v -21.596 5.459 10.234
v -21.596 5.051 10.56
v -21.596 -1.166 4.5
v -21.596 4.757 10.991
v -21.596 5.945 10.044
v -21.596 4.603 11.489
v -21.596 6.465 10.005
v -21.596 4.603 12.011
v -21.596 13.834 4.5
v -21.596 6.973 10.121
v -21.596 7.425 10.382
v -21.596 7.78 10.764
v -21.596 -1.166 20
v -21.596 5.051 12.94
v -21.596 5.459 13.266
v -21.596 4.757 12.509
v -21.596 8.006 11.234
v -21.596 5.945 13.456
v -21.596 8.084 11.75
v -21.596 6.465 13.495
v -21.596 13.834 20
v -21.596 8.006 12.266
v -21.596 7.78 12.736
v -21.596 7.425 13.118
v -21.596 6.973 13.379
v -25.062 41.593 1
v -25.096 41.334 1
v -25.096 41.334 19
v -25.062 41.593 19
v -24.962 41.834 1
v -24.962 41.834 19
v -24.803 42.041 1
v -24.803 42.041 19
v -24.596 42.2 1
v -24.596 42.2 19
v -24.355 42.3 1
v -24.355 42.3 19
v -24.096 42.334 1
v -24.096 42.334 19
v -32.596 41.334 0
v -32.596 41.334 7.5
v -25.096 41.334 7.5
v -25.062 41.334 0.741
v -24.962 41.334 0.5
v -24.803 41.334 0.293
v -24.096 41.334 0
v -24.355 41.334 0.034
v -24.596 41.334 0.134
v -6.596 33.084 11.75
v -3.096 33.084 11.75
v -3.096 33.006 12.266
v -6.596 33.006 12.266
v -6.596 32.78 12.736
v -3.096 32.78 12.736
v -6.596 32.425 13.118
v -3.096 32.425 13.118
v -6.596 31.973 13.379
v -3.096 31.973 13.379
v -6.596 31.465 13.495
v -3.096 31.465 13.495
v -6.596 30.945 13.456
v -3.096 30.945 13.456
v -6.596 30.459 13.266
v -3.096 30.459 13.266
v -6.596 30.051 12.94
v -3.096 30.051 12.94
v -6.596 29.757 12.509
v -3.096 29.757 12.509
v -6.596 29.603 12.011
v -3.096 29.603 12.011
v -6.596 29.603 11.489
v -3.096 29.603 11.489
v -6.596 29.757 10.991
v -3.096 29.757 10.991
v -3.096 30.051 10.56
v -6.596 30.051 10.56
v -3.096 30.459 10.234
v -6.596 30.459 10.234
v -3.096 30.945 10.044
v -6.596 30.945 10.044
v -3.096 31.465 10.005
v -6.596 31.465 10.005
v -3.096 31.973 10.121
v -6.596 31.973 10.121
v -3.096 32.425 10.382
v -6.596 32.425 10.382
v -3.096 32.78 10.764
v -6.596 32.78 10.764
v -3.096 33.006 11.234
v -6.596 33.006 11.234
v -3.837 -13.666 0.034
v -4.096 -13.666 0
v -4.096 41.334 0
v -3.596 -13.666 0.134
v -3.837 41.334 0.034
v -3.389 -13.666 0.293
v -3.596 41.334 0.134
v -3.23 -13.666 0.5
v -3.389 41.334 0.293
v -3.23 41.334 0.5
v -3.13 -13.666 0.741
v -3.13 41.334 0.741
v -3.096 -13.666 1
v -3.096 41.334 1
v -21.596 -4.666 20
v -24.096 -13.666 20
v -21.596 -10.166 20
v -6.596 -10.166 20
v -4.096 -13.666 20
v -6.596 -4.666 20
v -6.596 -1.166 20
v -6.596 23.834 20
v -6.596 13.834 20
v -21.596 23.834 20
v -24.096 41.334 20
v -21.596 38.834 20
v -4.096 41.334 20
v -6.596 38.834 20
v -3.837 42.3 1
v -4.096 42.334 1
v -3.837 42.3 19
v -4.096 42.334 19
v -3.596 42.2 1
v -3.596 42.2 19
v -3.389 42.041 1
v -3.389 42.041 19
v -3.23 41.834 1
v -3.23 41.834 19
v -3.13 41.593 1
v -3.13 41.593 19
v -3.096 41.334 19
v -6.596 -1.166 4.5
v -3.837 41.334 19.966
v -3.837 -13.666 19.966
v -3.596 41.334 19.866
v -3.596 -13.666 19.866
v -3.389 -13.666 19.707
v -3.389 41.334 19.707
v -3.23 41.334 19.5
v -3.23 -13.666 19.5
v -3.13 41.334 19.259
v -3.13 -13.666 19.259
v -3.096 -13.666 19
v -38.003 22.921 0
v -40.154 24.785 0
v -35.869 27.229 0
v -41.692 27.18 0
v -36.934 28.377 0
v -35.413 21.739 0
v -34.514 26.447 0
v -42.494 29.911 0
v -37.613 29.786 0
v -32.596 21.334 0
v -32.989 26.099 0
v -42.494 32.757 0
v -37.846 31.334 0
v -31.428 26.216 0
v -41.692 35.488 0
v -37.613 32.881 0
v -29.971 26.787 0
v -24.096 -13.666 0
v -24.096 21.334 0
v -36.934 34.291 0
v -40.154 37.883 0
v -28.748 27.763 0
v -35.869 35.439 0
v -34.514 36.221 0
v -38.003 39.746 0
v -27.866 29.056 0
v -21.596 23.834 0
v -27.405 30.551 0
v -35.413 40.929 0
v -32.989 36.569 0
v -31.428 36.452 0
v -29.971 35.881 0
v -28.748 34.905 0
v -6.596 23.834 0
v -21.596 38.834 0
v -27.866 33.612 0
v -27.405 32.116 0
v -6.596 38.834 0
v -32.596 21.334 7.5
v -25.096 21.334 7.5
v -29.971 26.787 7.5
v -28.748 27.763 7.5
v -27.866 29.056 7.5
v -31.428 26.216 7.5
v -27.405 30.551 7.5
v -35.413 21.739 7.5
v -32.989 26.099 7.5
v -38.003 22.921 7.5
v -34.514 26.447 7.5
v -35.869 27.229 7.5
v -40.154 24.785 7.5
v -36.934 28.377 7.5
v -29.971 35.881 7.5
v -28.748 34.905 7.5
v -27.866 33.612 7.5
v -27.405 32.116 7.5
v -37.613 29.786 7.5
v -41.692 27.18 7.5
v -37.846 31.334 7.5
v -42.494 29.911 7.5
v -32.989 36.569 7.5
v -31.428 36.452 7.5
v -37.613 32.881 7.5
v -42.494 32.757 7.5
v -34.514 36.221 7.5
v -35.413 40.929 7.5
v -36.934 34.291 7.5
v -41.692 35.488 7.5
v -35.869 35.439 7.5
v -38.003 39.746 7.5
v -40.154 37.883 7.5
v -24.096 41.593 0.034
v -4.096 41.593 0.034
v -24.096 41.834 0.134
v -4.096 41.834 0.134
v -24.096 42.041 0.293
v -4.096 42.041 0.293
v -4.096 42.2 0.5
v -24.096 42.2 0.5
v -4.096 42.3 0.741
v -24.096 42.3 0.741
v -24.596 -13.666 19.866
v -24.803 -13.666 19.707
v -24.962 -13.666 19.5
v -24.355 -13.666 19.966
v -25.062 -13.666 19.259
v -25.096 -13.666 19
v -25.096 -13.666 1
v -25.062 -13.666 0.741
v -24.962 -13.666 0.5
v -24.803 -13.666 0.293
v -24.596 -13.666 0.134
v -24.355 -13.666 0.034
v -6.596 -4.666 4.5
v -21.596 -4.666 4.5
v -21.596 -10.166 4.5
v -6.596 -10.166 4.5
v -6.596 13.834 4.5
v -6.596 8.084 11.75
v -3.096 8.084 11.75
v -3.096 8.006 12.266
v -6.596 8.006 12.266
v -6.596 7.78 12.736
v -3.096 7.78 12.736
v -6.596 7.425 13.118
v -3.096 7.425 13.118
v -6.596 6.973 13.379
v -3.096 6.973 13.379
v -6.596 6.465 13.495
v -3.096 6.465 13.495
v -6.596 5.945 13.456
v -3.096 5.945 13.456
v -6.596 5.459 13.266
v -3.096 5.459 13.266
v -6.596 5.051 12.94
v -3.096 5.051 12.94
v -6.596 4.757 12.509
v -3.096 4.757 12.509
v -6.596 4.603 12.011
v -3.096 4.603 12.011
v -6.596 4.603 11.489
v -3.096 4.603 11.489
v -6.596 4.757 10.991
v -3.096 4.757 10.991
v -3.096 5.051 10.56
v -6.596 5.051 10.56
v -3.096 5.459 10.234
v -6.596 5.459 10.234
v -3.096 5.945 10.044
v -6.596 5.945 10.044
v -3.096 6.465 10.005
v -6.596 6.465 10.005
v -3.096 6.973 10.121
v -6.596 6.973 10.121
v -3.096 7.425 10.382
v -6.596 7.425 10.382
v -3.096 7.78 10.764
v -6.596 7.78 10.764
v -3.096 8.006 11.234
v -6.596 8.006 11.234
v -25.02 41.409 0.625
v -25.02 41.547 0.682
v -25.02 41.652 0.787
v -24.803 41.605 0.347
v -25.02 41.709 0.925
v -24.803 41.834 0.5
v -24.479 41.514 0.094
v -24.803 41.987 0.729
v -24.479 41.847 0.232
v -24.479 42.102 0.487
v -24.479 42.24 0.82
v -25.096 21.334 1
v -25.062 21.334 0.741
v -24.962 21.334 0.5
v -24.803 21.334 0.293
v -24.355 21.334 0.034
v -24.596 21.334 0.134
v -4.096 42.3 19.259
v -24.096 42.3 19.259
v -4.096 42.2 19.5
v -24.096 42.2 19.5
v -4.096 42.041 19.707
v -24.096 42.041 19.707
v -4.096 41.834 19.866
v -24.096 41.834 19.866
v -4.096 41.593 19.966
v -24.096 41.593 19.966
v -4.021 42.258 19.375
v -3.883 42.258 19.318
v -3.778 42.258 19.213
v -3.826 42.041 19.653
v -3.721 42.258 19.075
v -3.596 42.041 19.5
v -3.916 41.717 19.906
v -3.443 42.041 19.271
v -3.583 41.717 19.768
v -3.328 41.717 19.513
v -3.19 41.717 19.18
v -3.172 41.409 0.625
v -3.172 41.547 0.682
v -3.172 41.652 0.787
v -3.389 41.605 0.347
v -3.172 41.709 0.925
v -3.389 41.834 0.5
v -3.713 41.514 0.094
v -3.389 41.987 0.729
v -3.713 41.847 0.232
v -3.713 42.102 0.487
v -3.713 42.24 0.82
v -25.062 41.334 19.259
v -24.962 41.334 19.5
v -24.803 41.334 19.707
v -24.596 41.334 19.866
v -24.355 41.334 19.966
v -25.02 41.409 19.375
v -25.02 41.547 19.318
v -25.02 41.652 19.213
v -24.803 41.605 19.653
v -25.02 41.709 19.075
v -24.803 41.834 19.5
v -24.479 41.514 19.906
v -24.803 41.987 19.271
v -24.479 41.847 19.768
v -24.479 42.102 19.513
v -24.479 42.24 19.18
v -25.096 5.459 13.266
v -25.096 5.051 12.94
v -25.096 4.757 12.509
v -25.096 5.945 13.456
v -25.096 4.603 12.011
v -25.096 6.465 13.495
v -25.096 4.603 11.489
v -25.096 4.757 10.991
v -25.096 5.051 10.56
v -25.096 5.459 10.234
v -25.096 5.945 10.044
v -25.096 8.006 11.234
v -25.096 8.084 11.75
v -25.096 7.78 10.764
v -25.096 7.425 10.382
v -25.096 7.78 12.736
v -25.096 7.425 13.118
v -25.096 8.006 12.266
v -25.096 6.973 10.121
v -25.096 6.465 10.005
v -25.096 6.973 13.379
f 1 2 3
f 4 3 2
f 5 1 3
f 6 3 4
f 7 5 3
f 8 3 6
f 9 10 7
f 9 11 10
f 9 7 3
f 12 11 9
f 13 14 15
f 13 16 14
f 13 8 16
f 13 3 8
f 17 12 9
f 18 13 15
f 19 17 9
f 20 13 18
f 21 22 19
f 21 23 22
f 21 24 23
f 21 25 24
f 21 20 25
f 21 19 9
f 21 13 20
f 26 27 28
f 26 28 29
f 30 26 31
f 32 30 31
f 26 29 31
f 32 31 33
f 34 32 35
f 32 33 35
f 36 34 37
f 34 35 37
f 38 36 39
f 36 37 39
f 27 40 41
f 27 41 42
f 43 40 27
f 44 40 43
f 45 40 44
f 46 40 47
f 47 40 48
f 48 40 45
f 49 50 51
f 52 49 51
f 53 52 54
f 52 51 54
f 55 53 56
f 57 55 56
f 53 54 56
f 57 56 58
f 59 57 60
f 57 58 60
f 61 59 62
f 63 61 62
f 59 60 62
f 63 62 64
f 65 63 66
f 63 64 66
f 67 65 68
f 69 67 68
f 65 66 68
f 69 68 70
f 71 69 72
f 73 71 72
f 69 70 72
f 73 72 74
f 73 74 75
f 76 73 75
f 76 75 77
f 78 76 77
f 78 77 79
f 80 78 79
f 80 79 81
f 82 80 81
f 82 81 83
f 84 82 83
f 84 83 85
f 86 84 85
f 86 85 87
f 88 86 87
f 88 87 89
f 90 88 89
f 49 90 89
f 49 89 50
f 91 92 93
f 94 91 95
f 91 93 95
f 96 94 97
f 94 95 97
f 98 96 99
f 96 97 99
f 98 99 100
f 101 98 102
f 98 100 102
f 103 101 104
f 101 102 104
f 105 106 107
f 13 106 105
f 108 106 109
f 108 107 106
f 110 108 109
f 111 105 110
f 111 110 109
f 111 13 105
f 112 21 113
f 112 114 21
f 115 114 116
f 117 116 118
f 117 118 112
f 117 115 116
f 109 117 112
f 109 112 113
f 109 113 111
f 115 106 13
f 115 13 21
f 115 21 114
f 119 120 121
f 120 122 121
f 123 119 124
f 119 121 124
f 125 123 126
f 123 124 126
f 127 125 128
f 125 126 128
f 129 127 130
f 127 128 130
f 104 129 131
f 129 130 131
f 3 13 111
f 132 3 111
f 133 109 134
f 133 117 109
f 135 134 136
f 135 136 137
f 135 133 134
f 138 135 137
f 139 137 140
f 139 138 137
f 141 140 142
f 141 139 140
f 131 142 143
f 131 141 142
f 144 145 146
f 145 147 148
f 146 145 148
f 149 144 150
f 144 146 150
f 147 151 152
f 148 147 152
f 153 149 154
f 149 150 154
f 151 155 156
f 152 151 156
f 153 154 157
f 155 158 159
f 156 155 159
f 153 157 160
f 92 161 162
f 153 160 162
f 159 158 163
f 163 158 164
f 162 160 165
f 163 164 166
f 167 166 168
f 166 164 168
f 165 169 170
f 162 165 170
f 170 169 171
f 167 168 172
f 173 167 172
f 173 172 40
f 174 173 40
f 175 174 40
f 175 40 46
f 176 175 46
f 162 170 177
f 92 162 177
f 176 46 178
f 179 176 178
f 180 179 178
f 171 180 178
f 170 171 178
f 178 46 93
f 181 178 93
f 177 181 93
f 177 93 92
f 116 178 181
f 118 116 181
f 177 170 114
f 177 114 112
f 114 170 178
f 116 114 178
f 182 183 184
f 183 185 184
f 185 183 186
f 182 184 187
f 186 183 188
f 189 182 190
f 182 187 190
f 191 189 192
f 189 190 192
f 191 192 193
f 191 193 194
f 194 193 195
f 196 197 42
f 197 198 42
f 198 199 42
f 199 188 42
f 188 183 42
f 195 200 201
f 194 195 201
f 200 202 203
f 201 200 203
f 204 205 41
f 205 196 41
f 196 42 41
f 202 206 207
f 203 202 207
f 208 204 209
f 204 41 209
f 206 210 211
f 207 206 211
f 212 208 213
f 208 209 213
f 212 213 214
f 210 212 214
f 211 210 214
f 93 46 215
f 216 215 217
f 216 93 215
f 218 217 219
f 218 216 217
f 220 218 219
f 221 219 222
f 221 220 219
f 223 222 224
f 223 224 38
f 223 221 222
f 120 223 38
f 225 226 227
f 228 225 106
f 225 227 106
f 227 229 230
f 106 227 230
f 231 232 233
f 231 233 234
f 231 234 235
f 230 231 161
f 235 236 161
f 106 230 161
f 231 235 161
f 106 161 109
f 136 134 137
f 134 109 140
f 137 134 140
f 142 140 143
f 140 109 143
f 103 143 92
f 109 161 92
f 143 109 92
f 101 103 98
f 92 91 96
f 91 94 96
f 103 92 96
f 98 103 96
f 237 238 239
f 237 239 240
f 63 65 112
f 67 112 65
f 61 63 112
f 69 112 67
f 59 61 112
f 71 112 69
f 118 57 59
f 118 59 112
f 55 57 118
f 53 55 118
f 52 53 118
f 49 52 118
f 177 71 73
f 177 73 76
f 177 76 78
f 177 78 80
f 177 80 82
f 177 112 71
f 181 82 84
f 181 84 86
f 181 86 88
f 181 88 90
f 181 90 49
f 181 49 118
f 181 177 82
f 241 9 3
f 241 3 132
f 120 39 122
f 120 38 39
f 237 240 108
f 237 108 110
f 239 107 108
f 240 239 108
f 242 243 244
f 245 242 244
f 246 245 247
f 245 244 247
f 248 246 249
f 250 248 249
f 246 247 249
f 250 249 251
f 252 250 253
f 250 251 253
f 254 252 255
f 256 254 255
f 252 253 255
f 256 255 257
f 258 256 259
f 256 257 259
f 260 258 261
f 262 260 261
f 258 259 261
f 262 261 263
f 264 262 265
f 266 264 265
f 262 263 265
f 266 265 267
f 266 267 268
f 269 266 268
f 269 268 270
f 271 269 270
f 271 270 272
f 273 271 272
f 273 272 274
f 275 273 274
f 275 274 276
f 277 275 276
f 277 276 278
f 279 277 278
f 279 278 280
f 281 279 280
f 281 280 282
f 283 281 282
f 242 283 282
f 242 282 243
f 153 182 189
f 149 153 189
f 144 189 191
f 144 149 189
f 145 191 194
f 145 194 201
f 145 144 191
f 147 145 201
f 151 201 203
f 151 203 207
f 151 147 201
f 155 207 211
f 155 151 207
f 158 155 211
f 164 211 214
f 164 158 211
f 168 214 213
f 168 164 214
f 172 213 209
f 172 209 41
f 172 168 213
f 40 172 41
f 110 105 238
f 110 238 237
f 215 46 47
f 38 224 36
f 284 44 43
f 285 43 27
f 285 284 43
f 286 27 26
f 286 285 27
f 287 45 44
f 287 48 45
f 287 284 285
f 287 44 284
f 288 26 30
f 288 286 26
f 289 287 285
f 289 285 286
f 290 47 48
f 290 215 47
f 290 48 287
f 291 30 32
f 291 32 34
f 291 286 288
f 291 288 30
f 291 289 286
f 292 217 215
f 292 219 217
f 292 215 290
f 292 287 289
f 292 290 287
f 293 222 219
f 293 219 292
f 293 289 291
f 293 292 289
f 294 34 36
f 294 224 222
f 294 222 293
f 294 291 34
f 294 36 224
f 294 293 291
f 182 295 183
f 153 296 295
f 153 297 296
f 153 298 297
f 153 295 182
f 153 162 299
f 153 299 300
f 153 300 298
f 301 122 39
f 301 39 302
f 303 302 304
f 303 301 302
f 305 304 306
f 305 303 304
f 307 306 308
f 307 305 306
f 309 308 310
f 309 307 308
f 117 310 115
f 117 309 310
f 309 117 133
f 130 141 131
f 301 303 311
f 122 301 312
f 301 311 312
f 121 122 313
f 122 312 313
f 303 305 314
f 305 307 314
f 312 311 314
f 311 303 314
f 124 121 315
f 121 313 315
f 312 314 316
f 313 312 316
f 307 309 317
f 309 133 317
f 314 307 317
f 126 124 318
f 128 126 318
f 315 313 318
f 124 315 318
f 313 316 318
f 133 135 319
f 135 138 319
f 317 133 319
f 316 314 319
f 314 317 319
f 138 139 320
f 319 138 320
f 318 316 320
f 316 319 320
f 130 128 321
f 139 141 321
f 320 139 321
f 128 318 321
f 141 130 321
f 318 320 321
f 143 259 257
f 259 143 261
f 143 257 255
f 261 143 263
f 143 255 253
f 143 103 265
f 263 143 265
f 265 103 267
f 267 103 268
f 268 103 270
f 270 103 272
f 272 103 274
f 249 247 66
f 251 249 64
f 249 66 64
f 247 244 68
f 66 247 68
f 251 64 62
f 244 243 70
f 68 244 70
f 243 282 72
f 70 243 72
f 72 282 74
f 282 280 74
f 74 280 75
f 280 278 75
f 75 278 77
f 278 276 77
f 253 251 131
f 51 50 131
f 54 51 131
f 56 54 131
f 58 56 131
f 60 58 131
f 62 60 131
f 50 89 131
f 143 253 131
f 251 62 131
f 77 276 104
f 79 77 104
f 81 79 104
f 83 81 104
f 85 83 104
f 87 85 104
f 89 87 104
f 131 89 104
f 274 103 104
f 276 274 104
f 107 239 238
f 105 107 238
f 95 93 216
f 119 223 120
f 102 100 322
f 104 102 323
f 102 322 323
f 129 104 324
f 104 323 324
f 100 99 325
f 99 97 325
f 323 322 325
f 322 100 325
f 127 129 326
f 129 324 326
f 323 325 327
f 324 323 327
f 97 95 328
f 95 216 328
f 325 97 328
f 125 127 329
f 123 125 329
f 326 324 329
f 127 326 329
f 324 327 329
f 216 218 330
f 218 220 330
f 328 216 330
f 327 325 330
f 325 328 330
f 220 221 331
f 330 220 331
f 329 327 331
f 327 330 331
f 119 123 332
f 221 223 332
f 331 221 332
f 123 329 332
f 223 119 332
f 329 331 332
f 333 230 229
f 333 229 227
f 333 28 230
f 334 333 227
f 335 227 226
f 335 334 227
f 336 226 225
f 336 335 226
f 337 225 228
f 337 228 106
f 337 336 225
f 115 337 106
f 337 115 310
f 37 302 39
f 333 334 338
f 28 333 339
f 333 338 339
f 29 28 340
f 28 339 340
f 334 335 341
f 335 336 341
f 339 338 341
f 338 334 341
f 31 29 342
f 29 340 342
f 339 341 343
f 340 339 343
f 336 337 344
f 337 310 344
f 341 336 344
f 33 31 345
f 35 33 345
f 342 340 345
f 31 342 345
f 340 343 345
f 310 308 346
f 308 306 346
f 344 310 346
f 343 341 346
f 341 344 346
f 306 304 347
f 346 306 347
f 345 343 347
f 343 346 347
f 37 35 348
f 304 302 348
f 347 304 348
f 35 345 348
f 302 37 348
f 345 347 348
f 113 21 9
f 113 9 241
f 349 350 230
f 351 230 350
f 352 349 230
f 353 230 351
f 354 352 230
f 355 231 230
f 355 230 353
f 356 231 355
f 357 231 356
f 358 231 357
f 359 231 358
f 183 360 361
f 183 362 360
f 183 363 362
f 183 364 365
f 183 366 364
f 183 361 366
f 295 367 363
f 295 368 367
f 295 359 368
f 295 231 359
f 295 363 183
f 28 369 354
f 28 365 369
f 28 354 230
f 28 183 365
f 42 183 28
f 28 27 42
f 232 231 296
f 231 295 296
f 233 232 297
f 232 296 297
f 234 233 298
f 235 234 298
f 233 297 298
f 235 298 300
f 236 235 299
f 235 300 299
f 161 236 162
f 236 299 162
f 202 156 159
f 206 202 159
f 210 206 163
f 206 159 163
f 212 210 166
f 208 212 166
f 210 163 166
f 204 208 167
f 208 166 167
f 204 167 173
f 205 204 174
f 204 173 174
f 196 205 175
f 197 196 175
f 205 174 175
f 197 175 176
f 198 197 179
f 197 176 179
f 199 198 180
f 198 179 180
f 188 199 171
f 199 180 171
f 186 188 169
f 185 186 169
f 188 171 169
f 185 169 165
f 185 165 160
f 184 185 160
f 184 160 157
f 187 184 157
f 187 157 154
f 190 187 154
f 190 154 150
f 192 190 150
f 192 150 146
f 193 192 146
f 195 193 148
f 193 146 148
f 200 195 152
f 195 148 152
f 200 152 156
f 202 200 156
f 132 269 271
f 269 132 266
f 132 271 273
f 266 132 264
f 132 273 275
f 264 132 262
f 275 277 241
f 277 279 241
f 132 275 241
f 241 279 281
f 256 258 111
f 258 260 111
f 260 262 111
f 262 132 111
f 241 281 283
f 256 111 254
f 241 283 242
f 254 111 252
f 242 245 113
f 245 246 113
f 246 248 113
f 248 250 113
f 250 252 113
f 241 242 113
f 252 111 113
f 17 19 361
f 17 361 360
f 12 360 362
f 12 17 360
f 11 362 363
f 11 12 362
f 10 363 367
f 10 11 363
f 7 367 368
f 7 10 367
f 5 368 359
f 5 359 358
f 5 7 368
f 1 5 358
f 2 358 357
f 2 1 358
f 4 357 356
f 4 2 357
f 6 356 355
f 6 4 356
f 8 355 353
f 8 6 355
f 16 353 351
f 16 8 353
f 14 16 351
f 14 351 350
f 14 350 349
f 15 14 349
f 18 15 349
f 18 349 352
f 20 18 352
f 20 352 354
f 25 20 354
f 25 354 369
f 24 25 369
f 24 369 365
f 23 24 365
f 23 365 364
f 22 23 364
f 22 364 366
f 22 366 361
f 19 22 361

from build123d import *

# Parameters (mm, degrees)
SKETCH1_W           = 22
SKETCH1_H           = 56
SKETCH1_W_2         = 15
SKETCH1_H_2         = 15
BOSS_EXTRUDE1_DEPTH = 20
SKETCH2_W           = 15
SKETCH2_H           = 15
SKETCH2_H_2         = 5.5
CUT_EXTRUDE1_DEPTH  = 15.5
SKETCH4_R           = 5.25
BOSS_EXTRUDE3_DEPTH = 7.5
FILLET4_R           = 1
SKETCH5_R           = 1.75
CUT_EXTRUDE2_DEPTH  = 10
CUT_EXTRUDE3_START  = -10
SKETCH6_R           = 1.75
CUT_EXTRUDE3_DEPTH  = 10


with BuildPart() as part:
    # Sketch1 → Boss-Extrude1 (new body)
    with BuildSketch(Plane.XY):
        with Locations((-14.096172604, 14.333947726)):
            Rectangle(SKETCH1_W, SKETCH1_H)
        with Locations((-14.096172604, 31.333947726)):
            Rectangle(SKETCH1_W_2, SKETCH1_H_2, mode=Mode.SUBTRACT)
    extrude(amount=BOSS_EXTRUDE1_DEPTH)

    # Sketch2 → Cut-Extrude1 (cut)
    with BuildSketch(Plane.XY.offset(20)):
        with Locations((-14.096172604, 6.333947726)):
            Rectangle(SKETCH2_W, SKETCH2_H)
        with Locations((-14.096172604, -7.416052274)):
            Rectangle(SKETCH2_W, SKETCH2_H_2)
    extrude(amount=-CUT_EXTRUDE1_DEPTH, mode=Mode.SUBTRACT)

    # Sketch4 → Boss-Extrude3 (add)
    with BuildSketch(Plane(origin=(0, 0, 0), x_dir=(-1, 0, 0), z_dir=(0, 0, -1))):
        with BuildLine():
            Line((32.596172604, 41.333947726), (25.096172604, 41.333947726))
            Line((25.096172604, 41.333947726), (25.096172604, 21.333947726))
            Line((25.096172604, 21.333947726), (32.596172604, 21.333947726))
            ThreePointArc((32.596172604, 21.333947726), (42.596172604, 31.333947726), (32.596172604, 41.333947726))
        make_face()
        with Locations((32.596172604, 31.333947726)):
            Circle(SKETCH4_R, mode=Mode.SUBTRACT)
    extrude(amount=-BOSS_EXTRUDE3_DEPTH)

    # Fillet4
    fillet4_edges = [part.edges().sort_by_distance(p)[0] for p in [
        (-3.096172604, 14.333947726, 20),
        (-14.096172604, 42.333947726, 20),
        (-25.096172604, 14.333947726, 20),
        (-14.096172604, 42.333947726, 0),
        (-3.096172604, 14.333947726, 0),
        (-25.096172604, 3.833947726, 0),
        (-25.096172604, 41.833947726, 0),
        (-25.096172604, 42.333947726, 10),
        (-3.096172604, 42.333947726, 10),
    ]]
    fillet(fillet4_edges, radius=FILLET4_R - 0.0001)  # a hair under: the kernel refuses the full size

    # Sketch5 → Cut-Extrude2 (cut)
    with BuildSketch(Plane(origin=(-3.096172604, 0, 0), x_dir=(0, 0, -1), z_dir=(1, 0, 0))):
        with Locations(Location((-11.75, 31.333947726, 0), (0, 0, 90))):
            Circle(SKETCH5_R)
        with Locations(Location((-11.75, 6.333947726, 0), (0, 0, 90))):
            Circle(SKETCH5_R)
    extrude(amount=-CUT_EXTRUDE2_DEPTH, mode=Mode.SUBTRACT)

    # Sketch6 → Cut-Extrude3 (cut)
    with BuildSketch(Plane.ZY.offset(25.096172604).offset(CUT_EXTRUDE3_START)):
        with Locations(Location((11.75, 6.333947726, 0), (0, 0, 90))):
            Circle(SKETCH6_R)
    extrude(amount=CUT_EXTRUDE3_DEPTH, mode=Mode.SUBTRACT)


solid = part.part
